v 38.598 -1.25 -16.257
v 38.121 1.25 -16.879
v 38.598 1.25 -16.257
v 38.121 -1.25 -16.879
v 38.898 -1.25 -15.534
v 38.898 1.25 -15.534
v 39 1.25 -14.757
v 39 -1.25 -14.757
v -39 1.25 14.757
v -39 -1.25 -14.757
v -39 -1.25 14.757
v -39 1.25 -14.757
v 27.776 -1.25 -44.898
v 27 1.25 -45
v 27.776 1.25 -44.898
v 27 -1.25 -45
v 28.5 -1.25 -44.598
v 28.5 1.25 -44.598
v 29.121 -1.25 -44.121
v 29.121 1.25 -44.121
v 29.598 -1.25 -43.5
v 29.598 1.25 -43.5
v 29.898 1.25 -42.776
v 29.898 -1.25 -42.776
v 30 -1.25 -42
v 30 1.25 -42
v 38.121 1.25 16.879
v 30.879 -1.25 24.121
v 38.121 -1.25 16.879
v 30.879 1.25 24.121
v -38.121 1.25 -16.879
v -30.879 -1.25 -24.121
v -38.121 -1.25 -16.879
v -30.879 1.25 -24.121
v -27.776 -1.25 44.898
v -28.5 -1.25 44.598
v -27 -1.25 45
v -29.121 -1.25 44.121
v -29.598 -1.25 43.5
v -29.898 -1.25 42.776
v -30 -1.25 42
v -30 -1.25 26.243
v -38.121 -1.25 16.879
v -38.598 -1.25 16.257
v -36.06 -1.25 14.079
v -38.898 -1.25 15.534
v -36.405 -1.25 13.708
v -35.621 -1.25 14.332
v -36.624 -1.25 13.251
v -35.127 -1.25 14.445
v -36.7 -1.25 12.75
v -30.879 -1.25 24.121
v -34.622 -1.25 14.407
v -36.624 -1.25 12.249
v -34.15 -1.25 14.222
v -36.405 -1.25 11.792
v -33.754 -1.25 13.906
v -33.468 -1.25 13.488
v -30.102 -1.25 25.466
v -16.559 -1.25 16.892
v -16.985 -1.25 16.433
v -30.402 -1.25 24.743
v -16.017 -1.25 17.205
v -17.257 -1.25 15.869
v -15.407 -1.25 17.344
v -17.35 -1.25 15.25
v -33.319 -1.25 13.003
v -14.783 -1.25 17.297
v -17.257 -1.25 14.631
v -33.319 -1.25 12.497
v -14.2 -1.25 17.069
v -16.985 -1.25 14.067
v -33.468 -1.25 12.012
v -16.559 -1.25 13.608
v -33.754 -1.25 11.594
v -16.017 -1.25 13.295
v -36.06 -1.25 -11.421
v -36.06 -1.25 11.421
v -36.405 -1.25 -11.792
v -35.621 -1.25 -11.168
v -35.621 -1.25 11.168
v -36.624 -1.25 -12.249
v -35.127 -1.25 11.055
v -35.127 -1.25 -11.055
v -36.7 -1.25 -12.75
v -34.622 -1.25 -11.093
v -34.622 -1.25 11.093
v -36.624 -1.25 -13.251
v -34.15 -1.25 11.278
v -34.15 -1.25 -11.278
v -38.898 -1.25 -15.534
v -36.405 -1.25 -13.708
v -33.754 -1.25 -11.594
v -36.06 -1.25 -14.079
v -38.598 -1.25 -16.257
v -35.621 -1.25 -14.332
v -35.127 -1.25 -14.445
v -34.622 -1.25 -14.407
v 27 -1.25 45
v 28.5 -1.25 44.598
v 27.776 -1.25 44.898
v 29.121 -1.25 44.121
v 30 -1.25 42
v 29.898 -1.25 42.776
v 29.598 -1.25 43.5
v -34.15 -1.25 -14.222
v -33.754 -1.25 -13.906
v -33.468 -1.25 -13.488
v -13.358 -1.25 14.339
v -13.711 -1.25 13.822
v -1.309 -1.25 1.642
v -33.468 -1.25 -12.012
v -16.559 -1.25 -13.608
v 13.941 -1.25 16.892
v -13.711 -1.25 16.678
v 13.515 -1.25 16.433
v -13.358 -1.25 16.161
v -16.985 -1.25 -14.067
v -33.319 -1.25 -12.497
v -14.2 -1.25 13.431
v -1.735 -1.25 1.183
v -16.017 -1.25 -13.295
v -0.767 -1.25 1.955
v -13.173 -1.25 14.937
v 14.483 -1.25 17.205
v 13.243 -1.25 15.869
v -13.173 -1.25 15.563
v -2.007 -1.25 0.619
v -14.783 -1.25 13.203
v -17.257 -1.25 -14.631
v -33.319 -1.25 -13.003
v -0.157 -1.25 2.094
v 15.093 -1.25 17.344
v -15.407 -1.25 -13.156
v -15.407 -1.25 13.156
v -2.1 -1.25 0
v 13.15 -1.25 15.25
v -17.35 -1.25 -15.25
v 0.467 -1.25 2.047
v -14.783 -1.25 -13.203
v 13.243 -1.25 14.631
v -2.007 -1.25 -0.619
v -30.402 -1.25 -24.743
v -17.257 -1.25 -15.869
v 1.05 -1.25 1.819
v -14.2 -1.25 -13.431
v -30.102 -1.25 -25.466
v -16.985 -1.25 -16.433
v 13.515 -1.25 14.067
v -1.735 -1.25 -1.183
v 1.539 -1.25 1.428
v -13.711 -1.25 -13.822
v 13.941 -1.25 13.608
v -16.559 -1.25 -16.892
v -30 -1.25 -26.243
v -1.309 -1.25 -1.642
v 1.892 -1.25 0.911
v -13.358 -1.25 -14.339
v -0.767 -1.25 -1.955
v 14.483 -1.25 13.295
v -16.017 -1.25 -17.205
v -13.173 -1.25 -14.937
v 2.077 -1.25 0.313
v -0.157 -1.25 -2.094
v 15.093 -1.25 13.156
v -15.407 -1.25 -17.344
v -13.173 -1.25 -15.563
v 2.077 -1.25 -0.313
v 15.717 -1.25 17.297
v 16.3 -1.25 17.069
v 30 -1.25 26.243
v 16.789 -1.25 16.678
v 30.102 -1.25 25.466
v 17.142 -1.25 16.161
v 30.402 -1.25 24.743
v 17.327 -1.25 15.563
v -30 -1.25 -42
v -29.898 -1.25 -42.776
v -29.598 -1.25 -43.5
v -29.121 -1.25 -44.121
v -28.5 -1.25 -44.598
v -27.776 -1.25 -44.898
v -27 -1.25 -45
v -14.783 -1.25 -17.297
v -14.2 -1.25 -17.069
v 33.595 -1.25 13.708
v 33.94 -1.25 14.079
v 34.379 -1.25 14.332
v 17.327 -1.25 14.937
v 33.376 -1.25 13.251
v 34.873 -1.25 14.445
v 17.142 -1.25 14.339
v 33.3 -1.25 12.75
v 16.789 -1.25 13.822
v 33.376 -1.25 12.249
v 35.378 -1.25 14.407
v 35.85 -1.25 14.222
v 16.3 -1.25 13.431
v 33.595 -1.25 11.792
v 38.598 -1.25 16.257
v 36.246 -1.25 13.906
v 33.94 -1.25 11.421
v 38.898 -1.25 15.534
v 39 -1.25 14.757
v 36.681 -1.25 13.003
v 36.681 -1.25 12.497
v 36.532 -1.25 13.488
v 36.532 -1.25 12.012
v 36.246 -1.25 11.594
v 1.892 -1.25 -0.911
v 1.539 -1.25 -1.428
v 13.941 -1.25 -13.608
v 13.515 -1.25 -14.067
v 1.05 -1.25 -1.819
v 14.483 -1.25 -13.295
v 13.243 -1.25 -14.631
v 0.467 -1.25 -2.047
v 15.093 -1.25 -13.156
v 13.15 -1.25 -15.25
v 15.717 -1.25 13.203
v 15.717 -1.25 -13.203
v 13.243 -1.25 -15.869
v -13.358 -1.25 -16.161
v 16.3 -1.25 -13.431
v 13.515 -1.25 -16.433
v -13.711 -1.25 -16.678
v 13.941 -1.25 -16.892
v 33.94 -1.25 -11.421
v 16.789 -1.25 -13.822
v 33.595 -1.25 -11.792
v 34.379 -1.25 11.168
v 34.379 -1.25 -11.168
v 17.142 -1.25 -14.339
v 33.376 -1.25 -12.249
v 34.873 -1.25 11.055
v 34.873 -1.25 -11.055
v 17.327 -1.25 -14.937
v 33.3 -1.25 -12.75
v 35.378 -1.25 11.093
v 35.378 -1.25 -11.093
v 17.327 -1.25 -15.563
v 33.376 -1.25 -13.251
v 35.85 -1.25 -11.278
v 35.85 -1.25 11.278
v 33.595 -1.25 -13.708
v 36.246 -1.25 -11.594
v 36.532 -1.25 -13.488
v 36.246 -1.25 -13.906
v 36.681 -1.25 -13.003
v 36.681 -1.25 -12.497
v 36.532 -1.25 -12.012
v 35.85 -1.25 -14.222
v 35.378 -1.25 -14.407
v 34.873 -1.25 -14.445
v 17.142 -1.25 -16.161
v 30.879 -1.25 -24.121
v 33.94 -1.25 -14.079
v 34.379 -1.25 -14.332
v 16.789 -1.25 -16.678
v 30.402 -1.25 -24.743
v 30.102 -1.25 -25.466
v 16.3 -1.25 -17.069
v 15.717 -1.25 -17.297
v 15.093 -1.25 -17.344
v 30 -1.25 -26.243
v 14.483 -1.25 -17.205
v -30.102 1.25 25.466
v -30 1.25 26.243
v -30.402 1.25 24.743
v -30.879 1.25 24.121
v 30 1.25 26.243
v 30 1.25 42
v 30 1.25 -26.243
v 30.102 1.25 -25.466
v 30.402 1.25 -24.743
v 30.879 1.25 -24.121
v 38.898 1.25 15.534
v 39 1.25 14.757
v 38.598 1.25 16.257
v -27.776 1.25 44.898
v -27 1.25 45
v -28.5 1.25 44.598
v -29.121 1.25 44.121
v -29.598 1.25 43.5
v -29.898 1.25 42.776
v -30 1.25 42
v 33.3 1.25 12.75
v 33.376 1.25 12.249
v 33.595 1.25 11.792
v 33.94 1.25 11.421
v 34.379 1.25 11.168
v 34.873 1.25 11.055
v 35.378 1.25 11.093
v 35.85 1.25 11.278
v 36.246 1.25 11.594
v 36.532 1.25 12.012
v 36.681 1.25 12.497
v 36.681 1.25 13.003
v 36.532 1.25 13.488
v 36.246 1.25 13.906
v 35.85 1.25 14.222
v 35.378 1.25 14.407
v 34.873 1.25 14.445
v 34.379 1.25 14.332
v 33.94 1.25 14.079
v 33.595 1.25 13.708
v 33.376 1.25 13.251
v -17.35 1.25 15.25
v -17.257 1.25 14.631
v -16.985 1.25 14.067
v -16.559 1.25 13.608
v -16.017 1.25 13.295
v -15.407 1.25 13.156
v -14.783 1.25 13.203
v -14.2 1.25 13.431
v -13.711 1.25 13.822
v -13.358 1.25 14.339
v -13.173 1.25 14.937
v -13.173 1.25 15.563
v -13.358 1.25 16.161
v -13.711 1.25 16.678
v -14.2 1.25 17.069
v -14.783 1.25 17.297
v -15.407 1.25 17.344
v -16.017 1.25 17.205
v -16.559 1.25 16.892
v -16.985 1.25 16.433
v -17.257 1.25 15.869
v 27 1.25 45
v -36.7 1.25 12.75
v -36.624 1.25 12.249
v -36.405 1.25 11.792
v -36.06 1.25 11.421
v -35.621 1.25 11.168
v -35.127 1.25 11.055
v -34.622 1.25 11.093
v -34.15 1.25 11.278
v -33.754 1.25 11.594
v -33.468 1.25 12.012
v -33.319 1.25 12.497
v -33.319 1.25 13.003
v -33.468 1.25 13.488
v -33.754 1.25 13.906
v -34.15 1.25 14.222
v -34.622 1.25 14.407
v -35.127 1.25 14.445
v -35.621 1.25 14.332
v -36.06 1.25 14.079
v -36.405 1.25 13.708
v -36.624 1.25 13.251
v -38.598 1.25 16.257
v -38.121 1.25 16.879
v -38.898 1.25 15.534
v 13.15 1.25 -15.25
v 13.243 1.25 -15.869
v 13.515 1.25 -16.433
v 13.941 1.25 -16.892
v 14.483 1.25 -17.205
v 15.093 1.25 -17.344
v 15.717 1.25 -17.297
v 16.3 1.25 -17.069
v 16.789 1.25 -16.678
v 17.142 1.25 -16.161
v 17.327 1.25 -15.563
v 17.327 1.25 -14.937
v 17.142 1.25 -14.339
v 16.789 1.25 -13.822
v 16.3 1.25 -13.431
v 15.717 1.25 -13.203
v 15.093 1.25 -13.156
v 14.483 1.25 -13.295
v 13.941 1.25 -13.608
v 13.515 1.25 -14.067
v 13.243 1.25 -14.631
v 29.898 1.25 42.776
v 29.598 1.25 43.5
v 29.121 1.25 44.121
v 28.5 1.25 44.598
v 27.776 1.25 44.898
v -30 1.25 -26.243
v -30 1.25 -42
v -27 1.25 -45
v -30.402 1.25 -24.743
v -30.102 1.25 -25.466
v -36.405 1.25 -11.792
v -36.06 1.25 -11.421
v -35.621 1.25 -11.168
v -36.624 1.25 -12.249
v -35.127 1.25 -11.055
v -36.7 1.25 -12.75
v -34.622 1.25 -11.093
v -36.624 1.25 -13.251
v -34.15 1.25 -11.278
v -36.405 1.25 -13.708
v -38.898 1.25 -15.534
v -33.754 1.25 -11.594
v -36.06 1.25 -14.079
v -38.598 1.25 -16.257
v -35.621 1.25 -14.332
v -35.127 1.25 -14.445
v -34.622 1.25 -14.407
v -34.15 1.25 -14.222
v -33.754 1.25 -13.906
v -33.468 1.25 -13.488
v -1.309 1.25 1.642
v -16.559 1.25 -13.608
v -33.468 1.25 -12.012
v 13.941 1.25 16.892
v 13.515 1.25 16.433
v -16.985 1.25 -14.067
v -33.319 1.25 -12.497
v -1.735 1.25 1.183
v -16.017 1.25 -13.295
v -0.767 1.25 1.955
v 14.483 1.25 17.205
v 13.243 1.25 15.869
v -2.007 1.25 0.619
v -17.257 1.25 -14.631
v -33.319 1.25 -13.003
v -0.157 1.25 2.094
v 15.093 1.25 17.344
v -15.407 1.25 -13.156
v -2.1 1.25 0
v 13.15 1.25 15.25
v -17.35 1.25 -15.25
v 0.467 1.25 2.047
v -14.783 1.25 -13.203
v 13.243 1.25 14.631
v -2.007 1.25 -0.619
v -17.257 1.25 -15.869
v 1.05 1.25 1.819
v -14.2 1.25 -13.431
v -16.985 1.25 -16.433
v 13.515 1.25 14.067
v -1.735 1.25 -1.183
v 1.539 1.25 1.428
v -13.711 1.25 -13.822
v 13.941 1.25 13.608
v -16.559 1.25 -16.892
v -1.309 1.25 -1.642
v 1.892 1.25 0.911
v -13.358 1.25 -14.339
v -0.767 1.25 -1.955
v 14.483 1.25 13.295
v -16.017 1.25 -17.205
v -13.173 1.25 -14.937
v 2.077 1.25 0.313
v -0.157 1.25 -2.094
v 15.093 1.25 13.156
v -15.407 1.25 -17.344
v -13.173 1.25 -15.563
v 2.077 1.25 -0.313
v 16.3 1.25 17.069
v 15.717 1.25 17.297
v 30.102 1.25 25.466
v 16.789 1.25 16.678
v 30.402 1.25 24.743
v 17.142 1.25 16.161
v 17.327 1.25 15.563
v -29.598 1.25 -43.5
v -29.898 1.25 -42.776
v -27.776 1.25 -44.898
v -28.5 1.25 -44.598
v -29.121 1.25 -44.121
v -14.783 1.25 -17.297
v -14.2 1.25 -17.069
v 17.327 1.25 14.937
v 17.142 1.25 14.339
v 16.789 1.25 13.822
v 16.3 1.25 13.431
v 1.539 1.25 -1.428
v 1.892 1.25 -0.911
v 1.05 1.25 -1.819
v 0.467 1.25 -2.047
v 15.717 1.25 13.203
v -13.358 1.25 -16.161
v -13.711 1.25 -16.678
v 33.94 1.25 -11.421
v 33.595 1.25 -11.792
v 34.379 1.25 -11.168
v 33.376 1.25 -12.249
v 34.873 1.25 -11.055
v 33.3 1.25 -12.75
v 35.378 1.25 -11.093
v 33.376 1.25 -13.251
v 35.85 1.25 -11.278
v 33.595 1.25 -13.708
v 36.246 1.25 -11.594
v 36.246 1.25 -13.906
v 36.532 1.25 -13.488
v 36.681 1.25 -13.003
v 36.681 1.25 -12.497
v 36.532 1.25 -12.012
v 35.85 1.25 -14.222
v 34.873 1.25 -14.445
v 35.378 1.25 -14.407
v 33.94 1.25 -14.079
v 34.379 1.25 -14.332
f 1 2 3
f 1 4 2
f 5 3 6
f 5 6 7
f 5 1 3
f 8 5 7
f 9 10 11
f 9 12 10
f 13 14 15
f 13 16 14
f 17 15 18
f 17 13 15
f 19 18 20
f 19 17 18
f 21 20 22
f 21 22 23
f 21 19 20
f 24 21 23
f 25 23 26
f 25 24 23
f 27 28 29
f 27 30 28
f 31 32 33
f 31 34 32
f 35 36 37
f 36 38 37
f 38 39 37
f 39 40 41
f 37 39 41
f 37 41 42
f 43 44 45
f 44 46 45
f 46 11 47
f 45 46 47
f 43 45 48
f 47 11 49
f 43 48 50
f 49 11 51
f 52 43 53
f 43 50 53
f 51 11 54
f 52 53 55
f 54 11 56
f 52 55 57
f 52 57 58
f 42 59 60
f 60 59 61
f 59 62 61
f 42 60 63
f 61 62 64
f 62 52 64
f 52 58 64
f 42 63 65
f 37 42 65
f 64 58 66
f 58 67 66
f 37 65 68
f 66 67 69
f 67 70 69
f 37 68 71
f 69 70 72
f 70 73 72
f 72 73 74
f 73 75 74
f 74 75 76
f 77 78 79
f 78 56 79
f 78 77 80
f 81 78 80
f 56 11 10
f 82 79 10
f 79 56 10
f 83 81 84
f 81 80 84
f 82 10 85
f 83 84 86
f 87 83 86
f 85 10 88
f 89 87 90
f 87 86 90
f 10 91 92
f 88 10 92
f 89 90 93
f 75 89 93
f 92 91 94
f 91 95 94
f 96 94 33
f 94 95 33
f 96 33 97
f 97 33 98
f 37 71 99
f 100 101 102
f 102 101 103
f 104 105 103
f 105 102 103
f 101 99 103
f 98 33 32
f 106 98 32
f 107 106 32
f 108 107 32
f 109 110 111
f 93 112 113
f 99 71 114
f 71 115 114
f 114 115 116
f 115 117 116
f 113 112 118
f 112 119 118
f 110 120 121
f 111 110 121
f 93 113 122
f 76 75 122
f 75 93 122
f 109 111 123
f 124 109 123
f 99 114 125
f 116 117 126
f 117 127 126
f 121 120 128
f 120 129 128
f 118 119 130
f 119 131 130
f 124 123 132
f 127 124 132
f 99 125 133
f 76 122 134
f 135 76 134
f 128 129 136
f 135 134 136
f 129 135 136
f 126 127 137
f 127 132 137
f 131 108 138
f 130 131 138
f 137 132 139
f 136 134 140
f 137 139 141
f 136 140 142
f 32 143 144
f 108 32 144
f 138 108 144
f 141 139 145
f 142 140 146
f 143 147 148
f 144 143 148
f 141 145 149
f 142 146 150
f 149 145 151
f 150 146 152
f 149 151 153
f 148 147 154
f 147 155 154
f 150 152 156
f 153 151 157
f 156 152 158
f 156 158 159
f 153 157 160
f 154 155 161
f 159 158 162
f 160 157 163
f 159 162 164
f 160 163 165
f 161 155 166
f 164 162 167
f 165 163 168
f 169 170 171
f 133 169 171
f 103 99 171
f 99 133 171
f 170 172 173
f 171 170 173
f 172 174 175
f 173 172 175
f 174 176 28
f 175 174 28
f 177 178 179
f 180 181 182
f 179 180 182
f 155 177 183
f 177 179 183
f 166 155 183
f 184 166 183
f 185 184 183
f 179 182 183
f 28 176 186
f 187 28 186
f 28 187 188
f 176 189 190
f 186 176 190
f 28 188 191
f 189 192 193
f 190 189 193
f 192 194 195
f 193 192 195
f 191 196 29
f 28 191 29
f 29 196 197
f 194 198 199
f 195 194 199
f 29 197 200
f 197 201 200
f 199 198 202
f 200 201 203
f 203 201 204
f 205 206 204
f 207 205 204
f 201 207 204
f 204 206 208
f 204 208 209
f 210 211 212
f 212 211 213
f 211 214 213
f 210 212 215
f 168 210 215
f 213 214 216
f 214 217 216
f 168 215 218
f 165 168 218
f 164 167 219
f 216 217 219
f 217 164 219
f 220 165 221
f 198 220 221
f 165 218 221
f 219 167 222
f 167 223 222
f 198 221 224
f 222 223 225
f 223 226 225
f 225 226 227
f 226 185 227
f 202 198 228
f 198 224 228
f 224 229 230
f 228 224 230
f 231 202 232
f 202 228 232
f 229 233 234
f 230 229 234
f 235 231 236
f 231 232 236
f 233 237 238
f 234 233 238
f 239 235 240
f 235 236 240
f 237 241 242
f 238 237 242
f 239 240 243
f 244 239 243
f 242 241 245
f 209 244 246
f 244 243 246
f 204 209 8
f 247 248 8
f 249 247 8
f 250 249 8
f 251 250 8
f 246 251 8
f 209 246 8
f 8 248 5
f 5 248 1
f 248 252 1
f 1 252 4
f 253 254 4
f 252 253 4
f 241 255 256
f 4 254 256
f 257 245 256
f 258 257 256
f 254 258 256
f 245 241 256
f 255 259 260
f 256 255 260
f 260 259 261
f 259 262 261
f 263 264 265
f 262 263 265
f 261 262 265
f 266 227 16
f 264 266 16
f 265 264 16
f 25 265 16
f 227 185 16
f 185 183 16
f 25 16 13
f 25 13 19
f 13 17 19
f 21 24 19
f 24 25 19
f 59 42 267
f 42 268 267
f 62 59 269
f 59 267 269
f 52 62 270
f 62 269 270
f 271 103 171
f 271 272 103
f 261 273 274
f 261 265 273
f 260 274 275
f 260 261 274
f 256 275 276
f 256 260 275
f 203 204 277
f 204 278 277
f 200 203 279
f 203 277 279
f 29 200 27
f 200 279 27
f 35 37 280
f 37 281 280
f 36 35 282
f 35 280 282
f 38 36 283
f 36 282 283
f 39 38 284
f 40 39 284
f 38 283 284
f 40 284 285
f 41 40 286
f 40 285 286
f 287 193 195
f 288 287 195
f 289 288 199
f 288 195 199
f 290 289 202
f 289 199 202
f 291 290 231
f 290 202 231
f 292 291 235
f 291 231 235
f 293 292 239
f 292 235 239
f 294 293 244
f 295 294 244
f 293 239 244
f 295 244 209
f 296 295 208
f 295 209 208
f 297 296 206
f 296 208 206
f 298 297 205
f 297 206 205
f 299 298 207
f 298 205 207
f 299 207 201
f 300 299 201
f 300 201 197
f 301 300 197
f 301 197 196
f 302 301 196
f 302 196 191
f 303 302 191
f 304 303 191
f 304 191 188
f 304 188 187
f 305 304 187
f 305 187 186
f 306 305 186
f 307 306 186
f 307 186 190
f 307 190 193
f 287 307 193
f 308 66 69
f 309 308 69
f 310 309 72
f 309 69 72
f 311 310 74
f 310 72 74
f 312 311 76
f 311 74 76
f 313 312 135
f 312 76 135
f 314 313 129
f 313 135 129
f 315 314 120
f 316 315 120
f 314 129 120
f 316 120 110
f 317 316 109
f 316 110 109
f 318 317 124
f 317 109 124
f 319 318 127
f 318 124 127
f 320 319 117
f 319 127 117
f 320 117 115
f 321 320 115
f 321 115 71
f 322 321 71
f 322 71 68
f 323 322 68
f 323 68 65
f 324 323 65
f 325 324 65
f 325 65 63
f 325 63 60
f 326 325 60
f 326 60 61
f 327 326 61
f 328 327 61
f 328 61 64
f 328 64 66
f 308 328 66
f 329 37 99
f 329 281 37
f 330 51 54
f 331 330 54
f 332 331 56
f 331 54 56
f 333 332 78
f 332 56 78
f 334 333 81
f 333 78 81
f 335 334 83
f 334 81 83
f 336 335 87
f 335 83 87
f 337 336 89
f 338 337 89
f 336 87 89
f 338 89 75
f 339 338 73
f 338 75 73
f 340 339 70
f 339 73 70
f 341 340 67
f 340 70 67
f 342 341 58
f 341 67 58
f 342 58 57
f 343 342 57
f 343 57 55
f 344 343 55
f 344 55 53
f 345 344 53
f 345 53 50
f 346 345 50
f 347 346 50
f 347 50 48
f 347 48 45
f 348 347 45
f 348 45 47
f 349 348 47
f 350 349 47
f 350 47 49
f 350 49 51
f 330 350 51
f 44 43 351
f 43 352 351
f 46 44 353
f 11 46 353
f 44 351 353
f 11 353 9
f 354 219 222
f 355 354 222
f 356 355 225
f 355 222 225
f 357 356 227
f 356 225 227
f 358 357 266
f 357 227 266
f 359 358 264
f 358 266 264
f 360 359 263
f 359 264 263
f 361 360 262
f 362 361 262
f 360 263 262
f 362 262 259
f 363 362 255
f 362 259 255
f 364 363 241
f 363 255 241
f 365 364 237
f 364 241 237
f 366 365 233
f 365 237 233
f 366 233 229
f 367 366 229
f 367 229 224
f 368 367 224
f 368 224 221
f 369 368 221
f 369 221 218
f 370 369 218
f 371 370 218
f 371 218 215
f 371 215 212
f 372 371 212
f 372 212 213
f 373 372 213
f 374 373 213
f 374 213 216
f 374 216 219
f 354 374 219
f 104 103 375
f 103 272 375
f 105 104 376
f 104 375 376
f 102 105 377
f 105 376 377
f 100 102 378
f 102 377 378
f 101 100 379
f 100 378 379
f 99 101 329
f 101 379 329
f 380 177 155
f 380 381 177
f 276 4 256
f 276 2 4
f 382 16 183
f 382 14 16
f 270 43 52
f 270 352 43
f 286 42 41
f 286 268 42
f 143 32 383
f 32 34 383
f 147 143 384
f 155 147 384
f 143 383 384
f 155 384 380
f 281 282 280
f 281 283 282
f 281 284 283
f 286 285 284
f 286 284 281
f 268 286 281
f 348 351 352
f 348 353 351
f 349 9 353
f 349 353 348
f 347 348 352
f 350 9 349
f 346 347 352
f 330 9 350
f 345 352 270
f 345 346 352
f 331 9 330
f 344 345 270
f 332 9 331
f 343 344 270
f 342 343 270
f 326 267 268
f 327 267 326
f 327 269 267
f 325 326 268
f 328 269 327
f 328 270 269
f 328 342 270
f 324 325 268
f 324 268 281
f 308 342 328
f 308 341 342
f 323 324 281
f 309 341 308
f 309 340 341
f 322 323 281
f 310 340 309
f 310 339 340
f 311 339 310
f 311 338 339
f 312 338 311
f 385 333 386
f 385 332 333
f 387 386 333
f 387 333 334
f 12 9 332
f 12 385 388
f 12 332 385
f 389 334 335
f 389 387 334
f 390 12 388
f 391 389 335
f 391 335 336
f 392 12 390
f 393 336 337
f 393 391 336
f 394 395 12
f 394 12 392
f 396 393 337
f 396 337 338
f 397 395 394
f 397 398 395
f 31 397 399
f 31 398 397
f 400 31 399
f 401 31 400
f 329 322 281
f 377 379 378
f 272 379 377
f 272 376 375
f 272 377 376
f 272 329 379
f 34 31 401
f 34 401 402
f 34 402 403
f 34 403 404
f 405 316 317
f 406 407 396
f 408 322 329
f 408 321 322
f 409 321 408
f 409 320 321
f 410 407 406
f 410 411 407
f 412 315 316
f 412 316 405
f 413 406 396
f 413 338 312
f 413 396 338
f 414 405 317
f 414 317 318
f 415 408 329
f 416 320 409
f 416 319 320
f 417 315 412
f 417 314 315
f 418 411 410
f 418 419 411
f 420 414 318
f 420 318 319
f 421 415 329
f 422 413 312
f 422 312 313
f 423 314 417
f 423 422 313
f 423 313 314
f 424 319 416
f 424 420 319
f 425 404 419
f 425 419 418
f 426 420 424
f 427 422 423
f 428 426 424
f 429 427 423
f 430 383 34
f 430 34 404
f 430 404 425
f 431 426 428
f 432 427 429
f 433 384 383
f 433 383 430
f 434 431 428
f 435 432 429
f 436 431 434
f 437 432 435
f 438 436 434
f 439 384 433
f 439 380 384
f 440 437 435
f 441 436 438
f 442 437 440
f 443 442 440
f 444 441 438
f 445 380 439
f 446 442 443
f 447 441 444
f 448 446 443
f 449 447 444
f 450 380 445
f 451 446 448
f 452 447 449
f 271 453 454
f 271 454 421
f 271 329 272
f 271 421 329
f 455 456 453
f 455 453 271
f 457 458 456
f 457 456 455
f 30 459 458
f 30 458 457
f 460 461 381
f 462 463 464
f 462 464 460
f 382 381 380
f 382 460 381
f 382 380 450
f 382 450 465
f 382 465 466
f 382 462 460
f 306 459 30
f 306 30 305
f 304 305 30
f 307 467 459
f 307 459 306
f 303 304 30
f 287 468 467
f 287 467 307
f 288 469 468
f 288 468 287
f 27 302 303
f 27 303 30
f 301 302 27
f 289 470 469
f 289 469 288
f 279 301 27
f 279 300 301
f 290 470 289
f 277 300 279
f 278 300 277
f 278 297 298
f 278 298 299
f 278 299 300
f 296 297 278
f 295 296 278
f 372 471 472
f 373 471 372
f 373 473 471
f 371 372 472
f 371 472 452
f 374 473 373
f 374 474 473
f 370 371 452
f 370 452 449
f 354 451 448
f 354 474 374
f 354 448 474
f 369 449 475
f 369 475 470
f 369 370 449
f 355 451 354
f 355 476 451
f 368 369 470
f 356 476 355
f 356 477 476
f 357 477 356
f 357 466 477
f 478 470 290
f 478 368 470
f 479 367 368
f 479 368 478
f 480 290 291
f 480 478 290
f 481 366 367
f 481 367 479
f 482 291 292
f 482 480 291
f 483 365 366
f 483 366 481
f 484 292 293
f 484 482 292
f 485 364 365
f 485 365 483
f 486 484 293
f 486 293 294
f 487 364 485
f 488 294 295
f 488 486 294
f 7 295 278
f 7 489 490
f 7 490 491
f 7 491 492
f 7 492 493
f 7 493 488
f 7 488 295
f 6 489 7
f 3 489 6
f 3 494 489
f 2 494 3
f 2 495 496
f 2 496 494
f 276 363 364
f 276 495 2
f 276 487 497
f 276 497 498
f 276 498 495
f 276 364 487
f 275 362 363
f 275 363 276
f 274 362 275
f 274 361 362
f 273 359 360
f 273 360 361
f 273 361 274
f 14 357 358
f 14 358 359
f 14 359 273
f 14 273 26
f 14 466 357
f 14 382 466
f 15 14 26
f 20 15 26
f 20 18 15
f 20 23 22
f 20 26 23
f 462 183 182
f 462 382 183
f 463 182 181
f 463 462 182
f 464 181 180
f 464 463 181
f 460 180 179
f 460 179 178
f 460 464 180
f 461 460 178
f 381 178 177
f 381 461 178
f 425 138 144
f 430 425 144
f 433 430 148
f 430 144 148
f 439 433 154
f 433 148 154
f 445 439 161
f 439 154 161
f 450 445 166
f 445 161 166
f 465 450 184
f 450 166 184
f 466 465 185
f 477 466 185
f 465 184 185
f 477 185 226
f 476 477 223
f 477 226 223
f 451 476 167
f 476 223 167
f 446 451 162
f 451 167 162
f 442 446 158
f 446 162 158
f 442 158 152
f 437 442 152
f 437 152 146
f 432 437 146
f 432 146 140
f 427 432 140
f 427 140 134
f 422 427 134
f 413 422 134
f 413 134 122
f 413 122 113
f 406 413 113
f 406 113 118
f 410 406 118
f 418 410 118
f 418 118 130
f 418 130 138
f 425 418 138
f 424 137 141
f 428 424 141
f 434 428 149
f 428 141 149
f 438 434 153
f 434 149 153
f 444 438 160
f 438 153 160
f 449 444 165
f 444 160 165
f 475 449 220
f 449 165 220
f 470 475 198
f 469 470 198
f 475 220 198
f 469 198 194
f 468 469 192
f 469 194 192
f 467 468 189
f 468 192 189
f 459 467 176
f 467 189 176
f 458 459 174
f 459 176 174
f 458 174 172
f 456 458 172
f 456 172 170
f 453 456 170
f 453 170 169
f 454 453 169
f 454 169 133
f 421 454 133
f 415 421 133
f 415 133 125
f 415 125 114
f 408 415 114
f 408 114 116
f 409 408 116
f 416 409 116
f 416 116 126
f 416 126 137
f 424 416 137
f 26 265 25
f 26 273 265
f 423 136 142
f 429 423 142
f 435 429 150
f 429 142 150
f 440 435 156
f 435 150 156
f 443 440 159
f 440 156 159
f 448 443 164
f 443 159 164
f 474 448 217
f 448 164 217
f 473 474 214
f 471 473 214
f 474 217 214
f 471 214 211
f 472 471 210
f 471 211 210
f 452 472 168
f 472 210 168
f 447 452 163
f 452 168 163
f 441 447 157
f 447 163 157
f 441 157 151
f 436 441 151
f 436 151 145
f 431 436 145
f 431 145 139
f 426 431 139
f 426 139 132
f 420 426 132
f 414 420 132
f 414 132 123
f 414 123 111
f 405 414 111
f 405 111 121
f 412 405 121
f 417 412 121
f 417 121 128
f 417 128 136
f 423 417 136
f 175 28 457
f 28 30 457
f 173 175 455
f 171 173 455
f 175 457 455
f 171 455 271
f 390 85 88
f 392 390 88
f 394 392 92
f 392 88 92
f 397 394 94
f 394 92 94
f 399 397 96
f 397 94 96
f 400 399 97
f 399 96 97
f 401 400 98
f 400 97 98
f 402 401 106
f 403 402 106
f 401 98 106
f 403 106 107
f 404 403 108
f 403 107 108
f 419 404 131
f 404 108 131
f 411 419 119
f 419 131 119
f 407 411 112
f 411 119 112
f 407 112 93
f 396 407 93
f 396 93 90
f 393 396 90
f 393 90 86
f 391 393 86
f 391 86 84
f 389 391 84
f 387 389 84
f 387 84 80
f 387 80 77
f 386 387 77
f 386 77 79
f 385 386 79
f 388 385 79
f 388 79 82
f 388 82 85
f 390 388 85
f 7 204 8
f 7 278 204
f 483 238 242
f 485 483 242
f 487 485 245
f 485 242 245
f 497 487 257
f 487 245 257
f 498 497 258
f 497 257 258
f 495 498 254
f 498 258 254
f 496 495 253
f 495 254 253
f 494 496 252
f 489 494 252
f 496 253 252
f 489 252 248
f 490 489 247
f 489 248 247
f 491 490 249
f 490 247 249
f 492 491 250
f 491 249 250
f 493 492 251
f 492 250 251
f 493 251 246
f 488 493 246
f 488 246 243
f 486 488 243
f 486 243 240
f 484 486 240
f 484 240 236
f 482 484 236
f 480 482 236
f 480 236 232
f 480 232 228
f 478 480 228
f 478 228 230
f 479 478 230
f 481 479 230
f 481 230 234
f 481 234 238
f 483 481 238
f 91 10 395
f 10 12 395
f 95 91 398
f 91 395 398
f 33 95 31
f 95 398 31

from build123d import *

# Parameters (mm, degrees)
SKETCH1_W                  = 60
SKETCH1_H                  = 90
BOSS_EXTRUDE1_DEPTH        = 1.25
FILLET1_R                  = 3
F_4_2_4_2_DIAMETER_HOLE1_D = 4.2
M3_CLEARANCE_HOLE1_D       = 3.4


with BuildPart() as part:
    # Sketch1 → Boss-Extrude1 (new, symmetric)
    with BuildSketch(Plane(origin=(0, 0, 0), x_dir=(1, 0, 0), z_dir=(0, 1, 0))):
        Polygon((30, 45), (-30, 45), (-30, 25), (-30, -25), (-30, -45), (30, -45), (30, -25), (30, 25), align=None)
        Rectangle(SKETCH1_W, SKETCH1_H)
        Polygon((-30, -25), (-30, 25), (-39, 16), (-39, -16), align=None)
        Polygon((39, 16), (30, 25), (30, -25), (39, -16), align=None)
    extrude(amount=BOSS_EXTRUDE1_DEPTH, both=True)

    # Fillet1
    fillet1_edges = [part.edges().sort_by_distance(p)[0] for p in [
        (30, 0, -25),
        (39, 0, -16),
        (39, 0, 16),
        (30, 0, 25),
        (30, 0, 45),
        (-30, 0, 45),
        (-30, 0, 25),
        (-39, 0, 16),
        (-39, 0, -16),
        (-30, 0, -25),
        (-30, 0, -45),
        (30, 0, -45),
    ]]
    fillet(fillet1_edges, radius=FILLET1_R)

    # Ø4.2 (4.2) Diameter Hole1 (through all)
    with Locations(Plane(origin=(0, 1.25, 0), x_dir=(1, 0, 0), z_dir=(0, 1, 0))):
        with Locations((0, 0), (15.25, -15.25), (-15.25, 15.25), (-15.25, -15.25), (15.25, 15.25)):
            Hole(F_4_2_4_2_DIAMETER_HOLE1_D / 2)

    # M3 Clearance Hole1 (through all)
    with Locations(Plane(origin=(0, 1.25, 0), x_dir=(1, 0, 0), z_dir=(0, 1, 0))):
        with Locations((35, 12.75), (35, -12.75), (-35, -12.75), (-35, 12.75)):
            Hole(M3_CLEARANCE_HOLE1_D / 2)


solid = part.part
